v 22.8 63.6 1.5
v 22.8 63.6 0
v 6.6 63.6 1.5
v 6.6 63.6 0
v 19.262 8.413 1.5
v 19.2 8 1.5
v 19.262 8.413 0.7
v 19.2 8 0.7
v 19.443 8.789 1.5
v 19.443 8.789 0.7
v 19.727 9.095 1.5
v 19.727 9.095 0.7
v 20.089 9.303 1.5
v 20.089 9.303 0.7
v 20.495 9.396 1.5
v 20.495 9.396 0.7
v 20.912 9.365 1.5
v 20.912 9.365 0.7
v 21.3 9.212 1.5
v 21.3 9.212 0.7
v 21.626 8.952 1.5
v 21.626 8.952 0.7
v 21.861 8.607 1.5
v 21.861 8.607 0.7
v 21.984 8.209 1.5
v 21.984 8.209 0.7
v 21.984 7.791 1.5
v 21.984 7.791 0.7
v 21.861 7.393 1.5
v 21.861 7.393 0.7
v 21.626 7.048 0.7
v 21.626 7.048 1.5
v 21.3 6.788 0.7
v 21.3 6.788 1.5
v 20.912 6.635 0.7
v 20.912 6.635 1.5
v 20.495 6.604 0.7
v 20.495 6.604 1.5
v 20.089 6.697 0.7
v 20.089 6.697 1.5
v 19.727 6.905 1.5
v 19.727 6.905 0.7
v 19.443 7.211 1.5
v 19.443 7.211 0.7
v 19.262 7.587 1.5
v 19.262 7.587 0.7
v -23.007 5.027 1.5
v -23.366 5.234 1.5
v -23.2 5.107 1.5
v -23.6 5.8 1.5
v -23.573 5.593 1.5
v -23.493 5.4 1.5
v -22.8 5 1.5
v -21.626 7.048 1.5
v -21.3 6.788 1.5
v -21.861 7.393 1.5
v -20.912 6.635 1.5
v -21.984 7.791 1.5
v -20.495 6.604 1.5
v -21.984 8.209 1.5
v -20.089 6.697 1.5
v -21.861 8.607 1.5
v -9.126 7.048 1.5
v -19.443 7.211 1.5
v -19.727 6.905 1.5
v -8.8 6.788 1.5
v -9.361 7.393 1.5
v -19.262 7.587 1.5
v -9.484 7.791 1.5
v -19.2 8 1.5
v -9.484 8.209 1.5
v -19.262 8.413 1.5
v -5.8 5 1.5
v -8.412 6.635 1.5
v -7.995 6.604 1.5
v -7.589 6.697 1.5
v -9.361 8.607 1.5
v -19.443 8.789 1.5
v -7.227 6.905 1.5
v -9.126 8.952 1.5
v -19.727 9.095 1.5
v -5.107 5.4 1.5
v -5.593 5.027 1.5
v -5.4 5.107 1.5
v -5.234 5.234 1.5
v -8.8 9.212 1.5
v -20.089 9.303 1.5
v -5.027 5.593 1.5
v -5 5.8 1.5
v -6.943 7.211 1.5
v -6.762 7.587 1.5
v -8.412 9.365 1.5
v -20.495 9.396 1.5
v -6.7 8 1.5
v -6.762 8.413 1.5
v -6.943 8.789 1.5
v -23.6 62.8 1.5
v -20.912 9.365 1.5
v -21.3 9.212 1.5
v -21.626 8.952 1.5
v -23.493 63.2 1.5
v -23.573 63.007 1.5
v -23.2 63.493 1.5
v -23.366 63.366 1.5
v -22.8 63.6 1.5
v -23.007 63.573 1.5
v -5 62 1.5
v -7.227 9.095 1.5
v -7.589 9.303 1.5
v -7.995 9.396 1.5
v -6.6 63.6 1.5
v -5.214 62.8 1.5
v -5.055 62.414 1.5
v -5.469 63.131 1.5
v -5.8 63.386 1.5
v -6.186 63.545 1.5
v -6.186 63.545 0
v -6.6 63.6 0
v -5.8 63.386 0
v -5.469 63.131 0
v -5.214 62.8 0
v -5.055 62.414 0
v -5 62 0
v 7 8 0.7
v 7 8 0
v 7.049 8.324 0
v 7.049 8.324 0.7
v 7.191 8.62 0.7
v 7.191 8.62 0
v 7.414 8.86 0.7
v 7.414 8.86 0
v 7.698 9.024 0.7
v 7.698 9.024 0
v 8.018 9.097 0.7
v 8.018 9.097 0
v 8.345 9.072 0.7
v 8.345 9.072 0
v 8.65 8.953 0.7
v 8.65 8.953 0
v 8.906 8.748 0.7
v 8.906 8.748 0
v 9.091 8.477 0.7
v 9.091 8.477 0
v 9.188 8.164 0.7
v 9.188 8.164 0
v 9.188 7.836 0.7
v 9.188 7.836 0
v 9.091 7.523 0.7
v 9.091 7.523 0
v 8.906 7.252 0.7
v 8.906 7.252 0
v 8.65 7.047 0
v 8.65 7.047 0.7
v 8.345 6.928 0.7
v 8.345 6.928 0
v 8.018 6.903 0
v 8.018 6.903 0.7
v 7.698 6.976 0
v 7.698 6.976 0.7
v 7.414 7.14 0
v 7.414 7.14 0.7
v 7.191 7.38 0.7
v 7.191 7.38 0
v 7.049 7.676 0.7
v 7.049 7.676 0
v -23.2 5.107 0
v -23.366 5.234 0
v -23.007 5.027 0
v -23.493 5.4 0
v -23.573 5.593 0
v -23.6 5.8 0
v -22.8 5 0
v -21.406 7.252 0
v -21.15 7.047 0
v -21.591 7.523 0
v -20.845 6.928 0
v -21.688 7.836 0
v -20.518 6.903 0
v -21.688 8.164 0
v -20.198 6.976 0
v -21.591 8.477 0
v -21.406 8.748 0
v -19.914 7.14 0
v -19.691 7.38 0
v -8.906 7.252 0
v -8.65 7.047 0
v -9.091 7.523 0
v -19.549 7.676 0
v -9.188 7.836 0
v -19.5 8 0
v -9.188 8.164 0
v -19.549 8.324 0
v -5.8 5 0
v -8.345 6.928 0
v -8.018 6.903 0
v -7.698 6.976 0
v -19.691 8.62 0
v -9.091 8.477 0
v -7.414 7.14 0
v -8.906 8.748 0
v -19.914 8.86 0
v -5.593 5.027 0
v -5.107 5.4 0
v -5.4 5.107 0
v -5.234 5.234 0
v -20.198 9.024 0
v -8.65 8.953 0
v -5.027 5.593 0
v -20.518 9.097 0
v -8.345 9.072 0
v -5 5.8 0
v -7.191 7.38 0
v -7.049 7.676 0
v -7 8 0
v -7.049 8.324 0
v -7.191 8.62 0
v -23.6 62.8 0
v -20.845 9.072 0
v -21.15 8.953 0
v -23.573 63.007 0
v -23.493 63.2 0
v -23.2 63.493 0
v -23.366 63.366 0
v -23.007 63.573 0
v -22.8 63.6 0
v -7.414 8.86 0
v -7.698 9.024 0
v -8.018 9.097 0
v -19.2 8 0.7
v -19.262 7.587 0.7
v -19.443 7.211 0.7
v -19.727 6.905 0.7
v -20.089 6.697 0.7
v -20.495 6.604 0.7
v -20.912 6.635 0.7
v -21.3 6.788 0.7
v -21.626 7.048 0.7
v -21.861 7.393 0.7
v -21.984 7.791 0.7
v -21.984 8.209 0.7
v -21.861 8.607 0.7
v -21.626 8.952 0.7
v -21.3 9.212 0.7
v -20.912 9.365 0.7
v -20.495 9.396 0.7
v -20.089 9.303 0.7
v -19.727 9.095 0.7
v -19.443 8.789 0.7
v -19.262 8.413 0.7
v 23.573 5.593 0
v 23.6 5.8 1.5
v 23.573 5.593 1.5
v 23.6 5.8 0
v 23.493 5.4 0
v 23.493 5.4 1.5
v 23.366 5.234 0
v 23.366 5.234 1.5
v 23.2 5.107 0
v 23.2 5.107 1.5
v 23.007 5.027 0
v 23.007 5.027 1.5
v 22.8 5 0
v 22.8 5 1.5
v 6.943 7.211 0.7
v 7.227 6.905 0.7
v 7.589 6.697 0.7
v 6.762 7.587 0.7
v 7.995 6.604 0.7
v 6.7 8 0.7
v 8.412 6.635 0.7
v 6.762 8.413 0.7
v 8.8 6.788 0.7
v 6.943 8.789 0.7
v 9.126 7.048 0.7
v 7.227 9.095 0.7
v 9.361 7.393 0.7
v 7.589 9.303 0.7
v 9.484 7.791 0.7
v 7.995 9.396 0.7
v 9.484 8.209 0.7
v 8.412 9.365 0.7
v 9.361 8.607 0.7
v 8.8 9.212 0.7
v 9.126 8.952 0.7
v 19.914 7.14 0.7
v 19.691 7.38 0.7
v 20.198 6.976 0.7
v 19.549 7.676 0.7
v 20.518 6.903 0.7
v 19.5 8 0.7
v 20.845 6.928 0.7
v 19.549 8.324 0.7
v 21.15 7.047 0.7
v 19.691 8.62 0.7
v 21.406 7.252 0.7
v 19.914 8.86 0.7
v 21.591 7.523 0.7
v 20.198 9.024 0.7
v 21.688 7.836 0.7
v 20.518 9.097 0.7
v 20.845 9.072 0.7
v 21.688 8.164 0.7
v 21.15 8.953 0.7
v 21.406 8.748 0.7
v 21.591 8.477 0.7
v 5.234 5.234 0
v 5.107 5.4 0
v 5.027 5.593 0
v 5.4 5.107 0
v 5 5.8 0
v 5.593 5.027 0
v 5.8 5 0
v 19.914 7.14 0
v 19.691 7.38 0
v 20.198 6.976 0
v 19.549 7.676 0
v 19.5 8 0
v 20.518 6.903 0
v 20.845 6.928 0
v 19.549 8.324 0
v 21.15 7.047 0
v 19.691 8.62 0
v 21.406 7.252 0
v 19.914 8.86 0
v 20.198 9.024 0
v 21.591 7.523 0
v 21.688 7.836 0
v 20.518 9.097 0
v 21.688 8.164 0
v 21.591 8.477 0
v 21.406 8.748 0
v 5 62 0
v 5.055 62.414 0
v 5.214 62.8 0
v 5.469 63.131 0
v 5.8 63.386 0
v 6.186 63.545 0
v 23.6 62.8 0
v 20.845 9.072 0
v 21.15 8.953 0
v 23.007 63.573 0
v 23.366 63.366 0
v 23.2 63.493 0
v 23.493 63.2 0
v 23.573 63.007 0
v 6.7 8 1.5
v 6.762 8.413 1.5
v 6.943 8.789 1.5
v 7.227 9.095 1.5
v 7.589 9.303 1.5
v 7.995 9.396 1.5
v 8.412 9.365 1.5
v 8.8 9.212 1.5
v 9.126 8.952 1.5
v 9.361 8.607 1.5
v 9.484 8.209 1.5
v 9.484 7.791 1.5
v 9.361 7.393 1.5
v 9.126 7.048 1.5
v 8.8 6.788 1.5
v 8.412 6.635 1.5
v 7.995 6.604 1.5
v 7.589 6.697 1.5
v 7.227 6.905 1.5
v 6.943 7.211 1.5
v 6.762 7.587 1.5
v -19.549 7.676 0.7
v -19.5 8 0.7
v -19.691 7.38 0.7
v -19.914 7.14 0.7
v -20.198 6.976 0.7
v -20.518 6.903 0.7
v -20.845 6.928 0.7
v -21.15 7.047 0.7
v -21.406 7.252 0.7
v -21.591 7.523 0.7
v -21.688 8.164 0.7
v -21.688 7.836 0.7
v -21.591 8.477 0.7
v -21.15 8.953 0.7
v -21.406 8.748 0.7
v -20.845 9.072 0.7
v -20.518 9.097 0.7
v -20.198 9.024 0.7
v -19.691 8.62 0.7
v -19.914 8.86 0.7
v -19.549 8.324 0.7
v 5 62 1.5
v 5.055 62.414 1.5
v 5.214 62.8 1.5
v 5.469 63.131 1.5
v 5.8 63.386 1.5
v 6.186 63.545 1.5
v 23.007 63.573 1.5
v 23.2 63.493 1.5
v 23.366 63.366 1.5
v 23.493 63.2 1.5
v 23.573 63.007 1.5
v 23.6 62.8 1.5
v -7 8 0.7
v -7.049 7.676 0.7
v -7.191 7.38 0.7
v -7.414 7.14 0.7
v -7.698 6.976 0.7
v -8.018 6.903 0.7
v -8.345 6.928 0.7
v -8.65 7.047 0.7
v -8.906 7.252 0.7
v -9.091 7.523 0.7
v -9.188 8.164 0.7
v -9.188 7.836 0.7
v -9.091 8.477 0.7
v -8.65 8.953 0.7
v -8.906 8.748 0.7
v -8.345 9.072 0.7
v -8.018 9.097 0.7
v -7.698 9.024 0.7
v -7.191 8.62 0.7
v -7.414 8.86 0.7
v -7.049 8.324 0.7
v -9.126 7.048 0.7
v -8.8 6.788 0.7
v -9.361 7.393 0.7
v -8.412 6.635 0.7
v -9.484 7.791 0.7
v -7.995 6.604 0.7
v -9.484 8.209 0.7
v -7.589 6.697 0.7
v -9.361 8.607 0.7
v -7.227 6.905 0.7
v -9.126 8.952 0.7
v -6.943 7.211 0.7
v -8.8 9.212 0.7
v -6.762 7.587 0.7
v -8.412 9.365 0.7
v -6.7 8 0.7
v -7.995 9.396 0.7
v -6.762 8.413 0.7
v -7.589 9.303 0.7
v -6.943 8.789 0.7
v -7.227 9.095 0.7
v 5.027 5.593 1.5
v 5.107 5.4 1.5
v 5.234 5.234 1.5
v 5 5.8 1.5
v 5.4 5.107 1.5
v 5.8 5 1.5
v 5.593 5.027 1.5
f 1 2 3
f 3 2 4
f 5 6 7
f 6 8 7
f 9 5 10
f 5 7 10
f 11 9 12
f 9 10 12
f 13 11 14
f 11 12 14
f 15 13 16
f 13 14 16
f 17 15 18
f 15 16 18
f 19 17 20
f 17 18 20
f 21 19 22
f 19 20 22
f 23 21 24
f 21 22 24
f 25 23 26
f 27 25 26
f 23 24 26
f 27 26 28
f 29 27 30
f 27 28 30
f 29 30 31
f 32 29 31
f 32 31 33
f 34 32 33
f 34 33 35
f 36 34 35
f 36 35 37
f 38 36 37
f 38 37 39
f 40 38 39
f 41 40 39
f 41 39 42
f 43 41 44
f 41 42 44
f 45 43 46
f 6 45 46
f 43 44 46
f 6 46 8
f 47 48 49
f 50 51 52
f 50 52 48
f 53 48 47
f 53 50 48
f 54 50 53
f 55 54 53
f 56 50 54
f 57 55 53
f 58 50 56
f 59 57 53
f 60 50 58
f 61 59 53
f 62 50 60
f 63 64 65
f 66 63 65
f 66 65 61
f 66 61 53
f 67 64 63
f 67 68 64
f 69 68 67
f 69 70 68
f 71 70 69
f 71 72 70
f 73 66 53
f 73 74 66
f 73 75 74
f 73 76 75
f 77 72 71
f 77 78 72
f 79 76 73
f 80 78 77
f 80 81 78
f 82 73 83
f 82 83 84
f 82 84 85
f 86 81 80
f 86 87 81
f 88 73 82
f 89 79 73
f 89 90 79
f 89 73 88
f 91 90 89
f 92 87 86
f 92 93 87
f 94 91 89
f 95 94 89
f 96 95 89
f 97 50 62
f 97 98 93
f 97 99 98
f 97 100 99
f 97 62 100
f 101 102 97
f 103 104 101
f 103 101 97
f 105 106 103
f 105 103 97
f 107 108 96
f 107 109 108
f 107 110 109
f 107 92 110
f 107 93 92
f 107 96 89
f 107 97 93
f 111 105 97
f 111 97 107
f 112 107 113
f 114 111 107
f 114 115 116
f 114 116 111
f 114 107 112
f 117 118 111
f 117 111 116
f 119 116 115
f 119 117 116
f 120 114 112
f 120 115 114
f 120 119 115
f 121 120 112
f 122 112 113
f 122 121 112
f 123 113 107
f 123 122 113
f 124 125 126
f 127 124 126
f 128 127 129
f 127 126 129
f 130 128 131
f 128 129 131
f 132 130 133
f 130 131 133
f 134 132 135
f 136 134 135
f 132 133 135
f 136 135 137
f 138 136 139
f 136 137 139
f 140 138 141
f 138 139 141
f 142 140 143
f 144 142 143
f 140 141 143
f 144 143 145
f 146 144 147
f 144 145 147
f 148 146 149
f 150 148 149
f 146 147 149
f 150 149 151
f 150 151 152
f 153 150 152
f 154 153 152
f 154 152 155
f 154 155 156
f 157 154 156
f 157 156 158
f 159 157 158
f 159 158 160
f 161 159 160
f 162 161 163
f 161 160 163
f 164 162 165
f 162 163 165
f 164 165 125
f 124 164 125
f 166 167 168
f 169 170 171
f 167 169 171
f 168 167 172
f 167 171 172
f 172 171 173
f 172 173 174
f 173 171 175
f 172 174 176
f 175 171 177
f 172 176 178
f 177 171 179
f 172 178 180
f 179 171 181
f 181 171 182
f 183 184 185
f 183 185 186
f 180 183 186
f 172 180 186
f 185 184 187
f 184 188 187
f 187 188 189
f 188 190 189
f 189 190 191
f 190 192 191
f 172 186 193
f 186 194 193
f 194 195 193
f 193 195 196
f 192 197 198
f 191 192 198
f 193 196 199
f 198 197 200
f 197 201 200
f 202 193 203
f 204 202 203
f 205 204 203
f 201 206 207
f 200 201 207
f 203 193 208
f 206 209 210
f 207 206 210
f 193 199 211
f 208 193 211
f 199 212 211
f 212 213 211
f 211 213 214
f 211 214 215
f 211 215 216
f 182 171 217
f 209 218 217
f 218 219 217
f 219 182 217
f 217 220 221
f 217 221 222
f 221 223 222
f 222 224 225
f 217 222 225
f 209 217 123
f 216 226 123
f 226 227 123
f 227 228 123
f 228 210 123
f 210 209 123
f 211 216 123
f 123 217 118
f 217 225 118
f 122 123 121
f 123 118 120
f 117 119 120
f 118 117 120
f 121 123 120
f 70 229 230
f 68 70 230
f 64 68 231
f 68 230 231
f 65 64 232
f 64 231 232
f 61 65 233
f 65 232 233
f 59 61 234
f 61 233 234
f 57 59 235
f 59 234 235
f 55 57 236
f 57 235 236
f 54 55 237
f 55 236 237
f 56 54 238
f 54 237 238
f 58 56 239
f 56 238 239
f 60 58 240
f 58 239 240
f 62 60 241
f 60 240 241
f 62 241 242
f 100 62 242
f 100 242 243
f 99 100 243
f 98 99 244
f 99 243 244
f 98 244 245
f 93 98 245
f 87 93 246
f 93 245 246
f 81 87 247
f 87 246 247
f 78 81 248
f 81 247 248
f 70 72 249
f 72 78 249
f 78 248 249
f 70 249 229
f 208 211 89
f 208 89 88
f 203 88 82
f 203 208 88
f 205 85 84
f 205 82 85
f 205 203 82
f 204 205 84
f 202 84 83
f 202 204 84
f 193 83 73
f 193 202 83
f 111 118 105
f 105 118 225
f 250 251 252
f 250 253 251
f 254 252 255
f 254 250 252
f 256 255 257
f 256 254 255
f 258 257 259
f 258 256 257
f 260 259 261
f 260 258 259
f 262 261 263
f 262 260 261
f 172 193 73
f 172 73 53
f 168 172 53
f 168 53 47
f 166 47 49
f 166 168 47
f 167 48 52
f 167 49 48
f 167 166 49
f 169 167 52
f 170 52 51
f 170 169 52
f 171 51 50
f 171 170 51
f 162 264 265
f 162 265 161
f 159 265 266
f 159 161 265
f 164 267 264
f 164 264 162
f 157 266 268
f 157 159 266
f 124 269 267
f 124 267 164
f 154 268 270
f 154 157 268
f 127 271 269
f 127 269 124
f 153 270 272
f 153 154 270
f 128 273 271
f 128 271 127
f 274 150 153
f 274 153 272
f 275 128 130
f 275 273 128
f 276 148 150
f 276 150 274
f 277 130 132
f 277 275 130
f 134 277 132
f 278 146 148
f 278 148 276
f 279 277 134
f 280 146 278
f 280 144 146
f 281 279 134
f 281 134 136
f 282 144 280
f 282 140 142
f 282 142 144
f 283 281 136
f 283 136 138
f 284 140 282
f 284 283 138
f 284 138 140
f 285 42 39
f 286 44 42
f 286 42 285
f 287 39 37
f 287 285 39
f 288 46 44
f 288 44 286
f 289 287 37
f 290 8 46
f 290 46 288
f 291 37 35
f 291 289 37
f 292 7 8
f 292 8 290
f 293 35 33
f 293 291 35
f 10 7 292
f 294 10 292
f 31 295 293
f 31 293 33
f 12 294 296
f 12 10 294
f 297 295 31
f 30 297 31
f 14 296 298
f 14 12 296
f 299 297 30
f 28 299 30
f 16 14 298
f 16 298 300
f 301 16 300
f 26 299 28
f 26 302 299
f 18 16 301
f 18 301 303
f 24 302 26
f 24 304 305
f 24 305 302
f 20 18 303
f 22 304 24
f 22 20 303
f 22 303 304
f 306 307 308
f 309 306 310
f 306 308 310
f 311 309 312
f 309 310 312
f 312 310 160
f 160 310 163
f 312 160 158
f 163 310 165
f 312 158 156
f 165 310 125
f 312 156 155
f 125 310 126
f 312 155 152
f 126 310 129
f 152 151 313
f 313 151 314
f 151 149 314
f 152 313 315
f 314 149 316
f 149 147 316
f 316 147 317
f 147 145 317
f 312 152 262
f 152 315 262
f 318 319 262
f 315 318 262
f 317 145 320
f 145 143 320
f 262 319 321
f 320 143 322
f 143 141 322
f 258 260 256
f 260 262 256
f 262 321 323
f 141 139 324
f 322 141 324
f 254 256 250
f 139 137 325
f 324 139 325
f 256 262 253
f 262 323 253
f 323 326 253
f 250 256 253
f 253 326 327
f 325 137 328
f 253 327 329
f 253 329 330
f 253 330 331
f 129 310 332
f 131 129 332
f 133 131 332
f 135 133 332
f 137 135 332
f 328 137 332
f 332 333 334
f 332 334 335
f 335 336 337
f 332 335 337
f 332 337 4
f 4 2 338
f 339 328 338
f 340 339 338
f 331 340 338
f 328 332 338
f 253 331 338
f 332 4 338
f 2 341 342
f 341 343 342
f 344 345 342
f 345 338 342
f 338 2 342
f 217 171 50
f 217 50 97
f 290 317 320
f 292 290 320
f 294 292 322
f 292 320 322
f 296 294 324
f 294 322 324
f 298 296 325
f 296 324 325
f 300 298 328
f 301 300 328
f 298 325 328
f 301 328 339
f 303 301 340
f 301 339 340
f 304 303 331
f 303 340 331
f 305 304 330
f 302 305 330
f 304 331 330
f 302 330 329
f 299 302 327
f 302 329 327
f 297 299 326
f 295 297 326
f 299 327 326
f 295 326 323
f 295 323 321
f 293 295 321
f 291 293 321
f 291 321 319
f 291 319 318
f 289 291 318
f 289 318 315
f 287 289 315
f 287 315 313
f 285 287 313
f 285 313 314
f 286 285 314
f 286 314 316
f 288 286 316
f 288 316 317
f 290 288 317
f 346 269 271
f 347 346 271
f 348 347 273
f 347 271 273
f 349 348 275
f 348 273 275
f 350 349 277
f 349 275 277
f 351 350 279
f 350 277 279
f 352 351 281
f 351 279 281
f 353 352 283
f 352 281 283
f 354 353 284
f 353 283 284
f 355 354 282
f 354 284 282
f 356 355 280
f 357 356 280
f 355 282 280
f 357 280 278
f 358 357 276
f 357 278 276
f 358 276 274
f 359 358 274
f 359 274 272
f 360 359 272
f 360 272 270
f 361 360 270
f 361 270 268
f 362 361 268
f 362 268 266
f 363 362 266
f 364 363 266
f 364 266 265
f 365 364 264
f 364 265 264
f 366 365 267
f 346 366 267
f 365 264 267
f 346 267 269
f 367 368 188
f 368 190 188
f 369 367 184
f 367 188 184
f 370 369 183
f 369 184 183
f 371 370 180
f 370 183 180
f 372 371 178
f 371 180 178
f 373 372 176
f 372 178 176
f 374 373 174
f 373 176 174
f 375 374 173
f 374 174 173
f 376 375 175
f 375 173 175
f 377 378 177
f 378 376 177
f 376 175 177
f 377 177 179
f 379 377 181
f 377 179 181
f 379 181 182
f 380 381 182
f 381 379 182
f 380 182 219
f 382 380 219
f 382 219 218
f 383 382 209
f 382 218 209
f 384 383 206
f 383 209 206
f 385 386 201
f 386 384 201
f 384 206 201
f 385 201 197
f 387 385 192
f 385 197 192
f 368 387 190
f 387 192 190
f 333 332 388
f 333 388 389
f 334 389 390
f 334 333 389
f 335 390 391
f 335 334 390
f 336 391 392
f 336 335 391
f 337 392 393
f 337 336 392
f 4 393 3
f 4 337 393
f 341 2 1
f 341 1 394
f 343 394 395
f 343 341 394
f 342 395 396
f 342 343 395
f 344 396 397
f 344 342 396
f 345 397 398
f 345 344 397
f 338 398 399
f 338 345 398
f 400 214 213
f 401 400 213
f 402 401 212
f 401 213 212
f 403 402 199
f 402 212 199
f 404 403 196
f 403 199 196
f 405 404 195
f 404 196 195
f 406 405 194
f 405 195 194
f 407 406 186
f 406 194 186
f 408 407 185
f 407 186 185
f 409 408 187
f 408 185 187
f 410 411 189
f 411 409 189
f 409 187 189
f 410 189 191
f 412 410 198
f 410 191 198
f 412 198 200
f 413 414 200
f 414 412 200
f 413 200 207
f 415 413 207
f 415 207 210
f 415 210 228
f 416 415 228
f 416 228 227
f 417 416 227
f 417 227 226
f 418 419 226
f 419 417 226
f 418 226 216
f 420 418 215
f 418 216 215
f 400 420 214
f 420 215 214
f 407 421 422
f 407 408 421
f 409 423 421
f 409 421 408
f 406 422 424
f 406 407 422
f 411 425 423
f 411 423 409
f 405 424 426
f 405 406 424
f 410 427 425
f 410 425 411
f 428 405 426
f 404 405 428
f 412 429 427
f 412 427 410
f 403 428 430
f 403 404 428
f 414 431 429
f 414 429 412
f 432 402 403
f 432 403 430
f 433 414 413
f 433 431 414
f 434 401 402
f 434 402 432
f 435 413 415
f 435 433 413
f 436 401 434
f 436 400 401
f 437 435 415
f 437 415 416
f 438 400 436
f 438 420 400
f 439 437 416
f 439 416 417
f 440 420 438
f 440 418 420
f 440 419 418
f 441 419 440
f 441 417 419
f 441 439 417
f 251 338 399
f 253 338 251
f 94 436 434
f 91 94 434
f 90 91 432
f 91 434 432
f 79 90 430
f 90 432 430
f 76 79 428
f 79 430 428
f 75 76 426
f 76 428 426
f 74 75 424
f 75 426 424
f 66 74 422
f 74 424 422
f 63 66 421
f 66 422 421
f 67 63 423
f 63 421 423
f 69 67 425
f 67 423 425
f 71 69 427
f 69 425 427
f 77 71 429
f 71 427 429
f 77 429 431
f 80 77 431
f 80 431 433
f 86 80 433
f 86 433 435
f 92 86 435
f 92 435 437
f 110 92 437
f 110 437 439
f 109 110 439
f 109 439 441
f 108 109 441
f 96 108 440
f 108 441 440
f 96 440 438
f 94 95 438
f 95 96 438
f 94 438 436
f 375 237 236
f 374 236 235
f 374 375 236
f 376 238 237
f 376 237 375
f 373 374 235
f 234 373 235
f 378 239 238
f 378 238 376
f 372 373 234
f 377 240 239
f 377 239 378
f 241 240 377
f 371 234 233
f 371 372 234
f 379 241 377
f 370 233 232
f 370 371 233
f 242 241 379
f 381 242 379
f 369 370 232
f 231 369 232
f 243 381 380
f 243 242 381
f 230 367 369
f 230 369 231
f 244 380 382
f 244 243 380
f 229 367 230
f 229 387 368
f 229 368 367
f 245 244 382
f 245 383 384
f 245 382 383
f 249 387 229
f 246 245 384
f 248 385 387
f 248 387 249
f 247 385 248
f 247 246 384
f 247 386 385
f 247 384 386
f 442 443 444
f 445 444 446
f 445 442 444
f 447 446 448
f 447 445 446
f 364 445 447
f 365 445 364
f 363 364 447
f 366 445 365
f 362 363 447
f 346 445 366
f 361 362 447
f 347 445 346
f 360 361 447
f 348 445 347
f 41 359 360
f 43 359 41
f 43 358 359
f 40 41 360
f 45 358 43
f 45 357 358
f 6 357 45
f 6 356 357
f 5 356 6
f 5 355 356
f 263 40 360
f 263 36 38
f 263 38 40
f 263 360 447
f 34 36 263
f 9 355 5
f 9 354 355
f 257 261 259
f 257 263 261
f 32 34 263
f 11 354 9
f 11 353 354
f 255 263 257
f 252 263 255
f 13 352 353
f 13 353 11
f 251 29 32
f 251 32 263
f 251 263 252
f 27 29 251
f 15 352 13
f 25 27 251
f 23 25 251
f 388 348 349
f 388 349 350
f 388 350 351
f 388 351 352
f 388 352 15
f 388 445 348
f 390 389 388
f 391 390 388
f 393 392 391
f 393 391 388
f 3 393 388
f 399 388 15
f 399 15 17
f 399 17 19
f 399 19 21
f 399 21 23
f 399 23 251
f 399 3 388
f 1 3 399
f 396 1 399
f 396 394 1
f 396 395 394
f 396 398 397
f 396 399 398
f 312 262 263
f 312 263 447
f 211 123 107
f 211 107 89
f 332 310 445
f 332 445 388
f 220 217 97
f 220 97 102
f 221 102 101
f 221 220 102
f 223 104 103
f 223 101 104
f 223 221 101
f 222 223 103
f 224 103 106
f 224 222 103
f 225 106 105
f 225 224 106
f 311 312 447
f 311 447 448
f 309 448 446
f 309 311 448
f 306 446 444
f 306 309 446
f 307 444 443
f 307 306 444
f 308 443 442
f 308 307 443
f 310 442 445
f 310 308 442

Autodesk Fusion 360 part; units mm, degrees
sketch "mriya-mcu-cover" plane through (0, 0, 0) normal (0, 0, 1) x (1, 0, 0)
  circle A0 centre (-20.6, 8) radius 1.1
  circle A1 centre (-8.1, 8) radius 1.1
  circle A2 centre (-20.6, 8) radius 1.4
  circle A3 centre (-8.1, 8) radius 1.4
  line L0 (-21.45, 24.8) -> (-21.45, 60.1)
  line L1 (-8.45, 23.7) -> (-20.35, 23.7)
  line L2 (-9.15, 27.5) -> (-19.65, 27.5) construction
  line L3 (-19.65, 55) -> (-9.15, 55) construction
  line L4 (-8.45, 61.2) -> (-20.35, 61.2)
  line L5 (-20.65, 54) -> (-20.65, 28.5) construction
  line L6 (-8.15, 28.5) -> (-8.15, 54) construction
  line L7 (-7.35, 60.1) -> (-7.35, 24.8)
  line L8 (-23.6, 5.8) -> (-23.6, 62.7) construction
  line L9 (-6.6, 63.6) -> (-22.8, 63.6)
  line L10 (-5, 62) -> (-5, 5.8)
  line L11 (-22.8, 5) -> (-5.9, 5) construction
  line L12 (-5.1, 62) -> (-5.1, 5.8) construction
  line L13 (-6.6, 63.5) -> (-22.8, 63.5) construction
  arc A4 (-5.1, 62) -> (-6.6, 63.5) centre (-6.6, 62) ccw construction
  arc A5 (-22.8, 63.5) -> (-23.6, 62.7) centre (-22.8, 62.7) ccw construction
  arc A6 (-23.6, 5.8) -> (-22.8, 5) centre (-22.8, 5.8) ccw construction
  arc A7 (-5.9, 5) -> (-5.1, 5.8) centre (-5.9, 5.8) ccw construction
  line L14 (-5.8, 5) -> (-22.8, 5)
  line L15 (-23.6, 5.8) -> (-23.6, 62.8)
  arc A8 (-22.8, 63.6) -> (-23.6, 62.8) centre (-22.8, 62.8) ccw
  arc A9 (-5, 62) -> (-6.6, 63.6) centre (-6.6, 62) ccw
  arc A10 (-5.8, 5) -> (-5, 5.8) centre (-5.8, 5.8) ccw
  arc A11 (-23.6, 5.8) -> (-22.8, 5) centre (-22.8, 5.8) ccw
  arc A12 (-19.65, 55) -> (-20.65, 54) centre (-19.65, 54) ccw construction
  arc A13 (-8.15, 54) -> (-9.15, 55) centre (-9.15, 54) ccw construction
  arc A14 (-20.65, 28.5) -> (-19.65, 27.5) centre (-19.65, 28.5) ccw construction
  arc A15 (-9.15, 27.5) -> (-8.15, 28.5) centre (-9.15, 28.5) ccw construction
  arc A16 (-21.45, 24.8) -> (-20.35, 23.7) centre (-20.35, 24.8) ccw
  arc A17 (-8.45, 23.7) -> (-7.35, 24.8) centre (-8.45, 24.8) ccw
  line L16 (-5.7, 26.1) -> (-5.7, 62) construction
  line L17 (-18.5, 62.9) -> (-6.6, 62.9) construction
  arc A18 (-19.1, 63.5) -> (-18.5, 62.9) centre (-18.5, 63.5) ccw construction
  arc A19 (-5.7, 26.1) -> (-5.1, 25.5) centre (-5.1, 26.1) ccw construction
  arc A20 (-5.7, 62) -> (-6.6, 62.9) centre (-6.6, 62) ccw construction
  circle A21 centre (-14.4, 14.5) radius 5 construction
  circle A22 centre (-20.6, 20.5) radius 1.7 construction
  circle A23 centre (-8.1, 20.5) radius 1.7 construction
  arc A24 (-20.35, 61.2) -> (-21.45, 60.1) centre (-20.35, 60.1) ccw
  arc A25 (-7.35, 60.1) -> (-8.45, 61.2) centre (-8.45, 60.1) ccw
  dimension "d8" = 2.2
  dimension "d9" = 2.2
  dimension "d17" = 2.8
  dimension "d18" = 2.8
  dimension "d585" = 10
  dimension "d588" = 3.4
  dimension "d589" = 3.4
extrude "Extrude75" add sketch "mriya-mcu-cover" along normal blind 1.5 contours L0 L1 L4 L7 A16 A17 A24 A25 | L9 L10 L14 L15 A8 A9 A10 A11 makes body 1
extrude "Extrude77" add sketch "mriya-mcu-cover" along normal blind 0.7 contours A2 | A3 bodies 1
mirror "Mirror9" about plane through (0, 0, 0) normal (1, 0, 0) of bodies 1 makes body 2
